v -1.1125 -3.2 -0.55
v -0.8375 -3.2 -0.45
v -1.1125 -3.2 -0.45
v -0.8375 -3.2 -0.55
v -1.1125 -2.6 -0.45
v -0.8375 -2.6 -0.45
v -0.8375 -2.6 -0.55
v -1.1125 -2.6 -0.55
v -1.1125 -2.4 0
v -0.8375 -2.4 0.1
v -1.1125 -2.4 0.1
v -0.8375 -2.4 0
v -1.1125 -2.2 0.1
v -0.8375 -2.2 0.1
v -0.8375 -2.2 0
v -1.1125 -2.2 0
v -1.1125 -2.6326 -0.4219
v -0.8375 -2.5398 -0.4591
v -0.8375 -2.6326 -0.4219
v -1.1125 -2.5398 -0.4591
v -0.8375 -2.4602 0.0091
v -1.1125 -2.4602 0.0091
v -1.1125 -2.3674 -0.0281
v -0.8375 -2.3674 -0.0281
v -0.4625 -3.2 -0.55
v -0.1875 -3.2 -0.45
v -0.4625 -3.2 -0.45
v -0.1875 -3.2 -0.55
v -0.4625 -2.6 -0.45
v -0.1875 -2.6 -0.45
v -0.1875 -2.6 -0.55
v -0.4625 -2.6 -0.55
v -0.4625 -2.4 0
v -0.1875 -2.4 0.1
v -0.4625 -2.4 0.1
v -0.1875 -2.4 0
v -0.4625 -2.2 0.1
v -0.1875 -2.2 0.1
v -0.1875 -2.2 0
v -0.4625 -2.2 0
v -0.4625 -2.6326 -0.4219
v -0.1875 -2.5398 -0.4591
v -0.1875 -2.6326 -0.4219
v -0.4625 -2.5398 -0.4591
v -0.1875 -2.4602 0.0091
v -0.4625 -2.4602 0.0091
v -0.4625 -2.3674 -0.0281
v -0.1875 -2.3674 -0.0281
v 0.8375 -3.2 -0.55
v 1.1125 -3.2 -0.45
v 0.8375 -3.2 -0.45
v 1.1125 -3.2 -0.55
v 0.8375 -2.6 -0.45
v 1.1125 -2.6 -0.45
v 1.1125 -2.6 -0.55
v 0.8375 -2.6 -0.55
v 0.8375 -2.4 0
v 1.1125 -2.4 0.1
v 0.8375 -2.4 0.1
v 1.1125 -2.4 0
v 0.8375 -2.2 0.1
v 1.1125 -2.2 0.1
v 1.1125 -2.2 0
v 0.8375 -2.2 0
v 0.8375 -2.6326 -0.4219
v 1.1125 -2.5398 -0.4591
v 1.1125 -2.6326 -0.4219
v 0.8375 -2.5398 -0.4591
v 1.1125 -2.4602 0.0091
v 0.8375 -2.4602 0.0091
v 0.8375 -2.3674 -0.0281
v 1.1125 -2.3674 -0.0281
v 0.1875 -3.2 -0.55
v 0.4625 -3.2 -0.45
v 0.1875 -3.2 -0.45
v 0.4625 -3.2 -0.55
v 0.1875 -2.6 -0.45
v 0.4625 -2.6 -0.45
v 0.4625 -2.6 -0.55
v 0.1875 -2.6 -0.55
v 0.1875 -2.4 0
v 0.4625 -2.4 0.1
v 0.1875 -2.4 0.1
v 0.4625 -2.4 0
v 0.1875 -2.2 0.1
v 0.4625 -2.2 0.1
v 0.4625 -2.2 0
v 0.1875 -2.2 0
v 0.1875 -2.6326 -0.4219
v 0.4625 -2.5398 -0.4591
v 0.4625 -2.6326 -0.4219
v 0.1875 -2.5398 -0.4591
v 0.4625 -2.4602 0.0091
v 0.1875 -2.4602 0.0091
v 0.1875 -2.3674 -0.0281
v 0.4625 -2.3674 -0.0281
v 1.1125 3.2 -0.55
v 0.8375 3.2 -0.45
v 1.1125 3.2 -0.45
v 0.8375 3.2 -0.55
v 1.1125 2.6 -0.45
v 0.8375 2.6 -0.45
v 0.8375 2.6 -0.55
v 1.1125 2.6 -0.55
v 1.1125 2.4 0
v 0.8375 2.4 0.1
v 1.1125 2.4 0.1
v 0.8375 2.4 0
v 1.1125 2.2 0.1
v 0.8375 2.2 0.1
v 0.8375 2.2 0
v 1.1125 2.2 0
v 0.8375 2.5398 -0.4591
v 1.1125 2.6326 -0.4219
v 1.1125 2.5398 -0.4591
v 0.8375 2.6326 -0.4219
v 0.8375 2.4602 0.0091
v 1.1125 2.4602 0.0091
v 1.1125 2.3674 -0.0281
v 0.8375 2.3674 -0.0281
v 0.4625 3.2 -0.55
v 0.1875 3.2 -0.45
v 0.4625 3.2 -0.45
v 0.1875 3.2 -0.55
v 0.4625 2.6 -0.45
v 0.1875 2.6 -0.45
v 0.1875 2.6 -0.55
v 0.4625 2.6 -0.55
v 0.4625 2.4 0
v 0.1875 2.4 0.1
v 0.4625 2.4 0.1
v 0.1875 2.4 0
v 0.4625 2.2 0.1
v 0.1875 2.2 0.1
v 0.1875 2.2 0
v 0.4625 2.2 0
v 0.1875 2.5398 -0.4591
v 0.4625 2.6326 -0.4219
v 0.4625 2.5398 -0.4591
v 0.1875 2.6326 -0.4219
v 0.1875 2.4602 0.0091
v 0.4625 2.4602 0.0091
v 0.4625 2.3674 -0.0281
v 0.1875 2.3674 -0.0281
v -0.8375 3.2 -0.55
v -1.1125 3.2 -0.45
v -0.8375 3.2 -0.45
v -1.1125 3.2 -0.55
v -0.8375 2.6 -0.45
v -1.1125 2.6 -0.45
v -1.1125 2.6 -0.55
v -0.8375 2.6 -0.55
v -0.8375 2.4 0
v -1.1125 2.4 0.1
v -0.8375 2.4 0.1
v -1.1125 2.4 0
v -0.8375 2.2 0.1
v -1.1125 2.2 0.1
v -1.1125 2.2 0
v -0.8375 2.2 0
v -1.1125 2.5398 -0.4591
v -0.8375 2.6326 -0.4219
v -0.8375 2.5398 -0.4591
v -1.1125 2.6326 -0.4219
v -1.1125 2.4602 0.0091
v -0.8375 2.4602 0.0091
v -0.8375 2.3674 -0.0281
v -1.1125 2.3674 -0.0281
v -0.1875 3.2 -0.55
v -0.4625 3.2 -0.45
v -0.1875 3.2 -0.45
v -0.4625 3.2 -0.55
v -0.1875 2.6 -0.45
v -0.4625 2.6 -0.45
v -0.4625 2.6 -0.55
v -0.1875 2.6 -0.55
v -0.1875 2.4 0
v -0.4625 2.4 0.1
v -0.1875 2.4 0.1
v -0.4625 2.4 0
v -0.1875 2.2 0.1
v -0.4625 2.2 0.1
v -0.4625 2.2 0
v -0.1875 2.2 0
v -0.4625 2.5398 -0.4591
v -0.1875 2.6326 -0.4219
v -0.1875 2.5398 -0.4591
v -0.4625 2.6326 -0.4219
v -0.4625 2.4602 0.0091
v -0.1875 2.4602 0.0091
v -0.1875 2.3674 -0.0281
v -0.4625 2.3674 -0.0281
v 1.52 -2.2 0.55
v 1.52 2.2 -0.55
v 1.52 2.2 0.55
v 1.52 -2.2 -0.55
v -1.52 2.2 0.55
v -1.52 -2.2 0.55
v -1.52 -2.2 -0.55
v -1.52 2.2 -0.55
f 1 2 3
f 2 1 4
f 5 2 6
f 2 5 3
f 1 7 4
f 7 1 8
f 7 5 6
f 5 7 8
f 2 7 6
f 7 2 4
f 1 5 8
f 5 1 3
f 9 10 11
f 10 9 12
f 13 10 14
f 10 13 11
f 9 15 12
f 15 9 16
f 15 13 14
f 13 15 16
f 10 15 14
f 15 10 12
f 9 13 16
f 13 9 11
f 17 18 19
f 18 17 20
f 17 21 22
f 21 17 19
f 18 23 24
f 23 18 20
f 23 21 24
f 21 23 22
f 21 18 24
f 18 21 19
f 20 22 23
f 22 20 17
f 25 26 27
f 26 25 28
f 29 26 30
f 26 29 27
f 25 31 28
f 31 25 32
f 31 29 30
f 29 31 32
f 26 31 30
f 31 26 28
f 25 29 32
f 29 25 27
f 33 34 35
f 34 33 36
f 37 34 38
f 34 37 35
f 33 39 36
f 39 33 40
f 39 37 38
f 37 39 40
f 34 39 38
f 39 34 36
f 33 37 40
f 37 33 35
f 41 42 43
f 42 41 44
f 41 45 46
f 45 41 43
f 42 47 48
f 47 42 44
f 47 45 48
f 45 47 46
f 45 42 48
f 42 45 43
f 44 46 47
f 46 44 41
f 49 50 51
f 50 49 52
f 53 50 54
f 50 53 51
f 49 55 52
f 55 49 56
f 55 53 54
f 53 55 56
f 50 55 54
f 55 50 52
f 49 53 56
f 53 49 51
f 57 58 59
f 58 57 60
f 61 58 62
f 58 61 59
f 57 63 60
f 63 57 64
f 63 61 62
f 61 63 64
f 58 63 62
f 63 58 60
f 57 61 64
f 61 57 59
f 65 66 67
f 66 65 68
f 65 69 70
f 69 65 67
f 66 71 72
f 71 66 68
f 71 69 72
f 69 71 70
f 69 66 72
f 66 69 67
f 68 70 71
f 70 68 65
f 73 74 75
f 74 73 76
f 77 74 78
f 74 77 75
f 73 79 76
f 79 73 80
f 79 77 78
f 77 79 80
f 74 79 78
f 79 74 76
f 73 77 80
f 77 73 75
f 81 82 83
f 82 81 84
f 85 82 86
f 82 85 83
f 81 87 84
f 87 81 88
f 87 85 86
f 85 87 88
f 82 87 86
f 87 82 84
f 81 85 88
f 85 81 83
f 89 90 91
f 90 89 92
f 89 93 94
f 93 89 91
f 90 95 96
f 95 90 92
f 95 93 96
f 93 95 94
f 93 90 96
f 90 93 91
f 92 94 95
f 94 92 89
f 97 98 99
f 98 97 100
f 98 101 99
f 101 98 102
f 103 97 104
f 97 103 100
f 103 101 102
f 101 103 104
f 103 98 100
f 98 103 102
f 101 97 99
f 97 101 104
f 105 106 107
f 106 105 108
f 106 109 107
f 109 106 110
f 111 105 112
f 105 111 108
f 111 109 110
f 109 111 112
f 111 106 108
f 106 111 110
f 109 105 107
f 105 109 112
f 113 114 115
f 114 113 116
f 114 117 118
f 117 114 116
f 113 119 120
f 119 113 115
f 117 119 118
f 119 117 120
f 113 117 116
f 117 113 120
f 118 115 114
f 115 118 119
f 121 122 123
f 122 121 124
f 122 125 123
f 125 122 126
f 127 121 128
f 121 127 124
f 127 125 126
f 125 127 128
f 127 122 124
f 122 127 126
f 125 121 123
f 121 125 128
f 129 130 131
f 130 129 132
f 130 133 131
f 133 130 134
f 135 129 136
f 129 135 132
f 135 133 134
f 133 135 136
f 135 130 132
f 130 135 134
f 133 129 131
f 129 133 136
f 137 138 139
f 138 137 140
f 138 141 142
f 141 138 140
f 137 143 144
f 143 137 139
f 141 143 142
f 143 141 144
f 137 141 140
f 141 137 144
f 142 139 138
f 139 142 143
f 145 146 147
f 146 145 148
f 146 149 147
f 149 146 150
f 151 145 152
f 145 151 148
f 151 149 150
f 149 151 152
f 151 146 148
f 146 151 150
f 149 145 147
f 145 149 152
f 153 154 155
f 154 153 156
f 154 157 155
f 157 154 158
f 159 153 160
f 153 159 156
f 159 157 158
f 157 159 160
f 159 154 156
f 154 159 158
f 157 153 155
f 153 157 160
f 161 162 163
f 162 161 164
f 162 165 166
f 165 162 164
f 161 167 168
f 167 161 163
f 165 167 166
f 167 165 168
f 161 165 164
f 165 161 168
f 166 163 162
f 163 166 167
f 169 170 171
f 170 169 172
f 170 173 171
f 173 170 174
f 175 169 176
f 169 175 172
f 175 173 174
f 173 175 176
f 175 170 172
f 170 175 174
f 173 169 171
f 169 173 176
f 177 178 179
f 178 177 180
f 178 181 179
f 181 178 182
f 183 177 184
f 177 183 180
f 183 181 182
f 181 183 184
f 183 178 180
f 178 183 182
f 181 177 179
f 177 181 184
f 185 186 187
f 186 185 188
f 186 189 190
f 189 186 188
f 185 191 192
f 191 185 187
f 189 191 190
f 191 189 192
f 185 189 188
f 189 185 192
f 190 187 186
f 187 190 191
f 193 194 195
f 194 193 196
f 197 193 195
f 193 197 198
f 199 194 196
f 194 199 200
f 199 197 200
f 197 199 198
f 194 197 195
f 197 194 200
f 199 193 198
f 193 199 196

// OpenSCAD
/* 
 Traffic Light Cufflinks case_parts
 (c) Brendan M. Sleight 2012
 This file is part of Cuffelink.com project
 
 Cuffelink is free software: you can redistribute it and/or modify
 it under the terms of the GNU General Public License as published by
 the Free Software Foundation, either version 3 of the License, or
 (at your option) any later version.
 
 Cuffelink is distributed in the hope that it will be useful,
 but WITHOUT ANY WARRANTY; without even the implied warranty of
 MERCHANTABILITY or FITNESS FOR A PARTICULAR PURPOSE.  See the
 GNU General Public License for more details.
 
 You should have received a copy of the GNU General Public License
 along with Cuffelink.  If not, see <http://www.gnu.org/licenses/>.
  
 */


// 360 and 180 normally
$fn=36;
steps_per_turn = 18;
//alpha = 0.2725;
alpha = 1;

chip_height = 1.10;
chip_width = 4.4;
chip_length = 3.04;

leg_pitch=0.65;
leg_height = 0.1;
leg_width=0.275;
leg_end_length=0.6;
leg_start_length=0.2;

leg_mid_real_height=(chip_height/2)-(leg_height/2);
leg_mid_length=0.2;
// tan t = opp/adj = leg_mid_length/leg_mid_real_height
leg_mid_angle=atan(leg_mid_length/leg_mid_real_height);
echo(leg_mid_angle);

leg_total_length=leg_end_length + leg_start_length + leg_mid_length;
leg_pitch_total=leg_pitch*3;


module chip() 
{
    color("black", alpha) 
    {
        cube(size = [chip_length, chip_width, chip_height], center = true);
    }
}


module leg_end() 
{
    cube(size = [leg_end_length, leg_width, leg_height], center = true);
}

module leg_start() 
{
    cube(size = [leg_start_length, leg_width, leg_height], center = true);
}

module leg_mid() 
{
    // Cos t = adj/hyp
    // hyp = adj/cos t = leg_mid_real_height / cos (leg_mid_angle)
    rotate(a=[0,90-leg_mid_angle,0]) cube(size = [leg_mid_real_height * cos(leg_mid_angle), leg_width, leg_height], center = true);
}

module leg()
{
    rotate([0,0,270]) 
    {
        translate([leg_total_length/2-leg_end_length/2,0,-chip_height/4]) leg_end();
        translate([-leg_total_length/2+leg_start_length/2,0,+chip_height/4]) leg_start();
        translate([-leg_total_length/2+leg_mid_length/2+leg_start_length,0,0]) leg_mid();
    }
}

module leg_near_side()
{
    translate([0,-chip_width/2-leg_total_length/2,-chip_height/4+leg_height/2])
    {
    //leg_pitch_total
      translate([-leg_pitch*3/2,0,0]) leg();
      translate([-leg_pitch/2,0,0]) leg();
      translate([leg_pitch*3/2,0,0]) leg();
      translate([+leg_pitch/2,0,0]) leg();
    }
}

module leg_far_side()
{
    translate([0,+chip_width/2+leg_total_length/2,-chip_height/4+leg_height/2])  rotate([0,0,180])
    {
    //leg_pitch_total
      translate([-leg_pitch*3/2,0,0])leg();
      translate([-leg_pitch/2,0,0]) leg();
      translate([leg_pitch*3/2,0,0]) leg();
      translate([+leg_pitch/2,0,0]) leg();
    }
}

chip();
leg_near_side();
leg_far_side();
